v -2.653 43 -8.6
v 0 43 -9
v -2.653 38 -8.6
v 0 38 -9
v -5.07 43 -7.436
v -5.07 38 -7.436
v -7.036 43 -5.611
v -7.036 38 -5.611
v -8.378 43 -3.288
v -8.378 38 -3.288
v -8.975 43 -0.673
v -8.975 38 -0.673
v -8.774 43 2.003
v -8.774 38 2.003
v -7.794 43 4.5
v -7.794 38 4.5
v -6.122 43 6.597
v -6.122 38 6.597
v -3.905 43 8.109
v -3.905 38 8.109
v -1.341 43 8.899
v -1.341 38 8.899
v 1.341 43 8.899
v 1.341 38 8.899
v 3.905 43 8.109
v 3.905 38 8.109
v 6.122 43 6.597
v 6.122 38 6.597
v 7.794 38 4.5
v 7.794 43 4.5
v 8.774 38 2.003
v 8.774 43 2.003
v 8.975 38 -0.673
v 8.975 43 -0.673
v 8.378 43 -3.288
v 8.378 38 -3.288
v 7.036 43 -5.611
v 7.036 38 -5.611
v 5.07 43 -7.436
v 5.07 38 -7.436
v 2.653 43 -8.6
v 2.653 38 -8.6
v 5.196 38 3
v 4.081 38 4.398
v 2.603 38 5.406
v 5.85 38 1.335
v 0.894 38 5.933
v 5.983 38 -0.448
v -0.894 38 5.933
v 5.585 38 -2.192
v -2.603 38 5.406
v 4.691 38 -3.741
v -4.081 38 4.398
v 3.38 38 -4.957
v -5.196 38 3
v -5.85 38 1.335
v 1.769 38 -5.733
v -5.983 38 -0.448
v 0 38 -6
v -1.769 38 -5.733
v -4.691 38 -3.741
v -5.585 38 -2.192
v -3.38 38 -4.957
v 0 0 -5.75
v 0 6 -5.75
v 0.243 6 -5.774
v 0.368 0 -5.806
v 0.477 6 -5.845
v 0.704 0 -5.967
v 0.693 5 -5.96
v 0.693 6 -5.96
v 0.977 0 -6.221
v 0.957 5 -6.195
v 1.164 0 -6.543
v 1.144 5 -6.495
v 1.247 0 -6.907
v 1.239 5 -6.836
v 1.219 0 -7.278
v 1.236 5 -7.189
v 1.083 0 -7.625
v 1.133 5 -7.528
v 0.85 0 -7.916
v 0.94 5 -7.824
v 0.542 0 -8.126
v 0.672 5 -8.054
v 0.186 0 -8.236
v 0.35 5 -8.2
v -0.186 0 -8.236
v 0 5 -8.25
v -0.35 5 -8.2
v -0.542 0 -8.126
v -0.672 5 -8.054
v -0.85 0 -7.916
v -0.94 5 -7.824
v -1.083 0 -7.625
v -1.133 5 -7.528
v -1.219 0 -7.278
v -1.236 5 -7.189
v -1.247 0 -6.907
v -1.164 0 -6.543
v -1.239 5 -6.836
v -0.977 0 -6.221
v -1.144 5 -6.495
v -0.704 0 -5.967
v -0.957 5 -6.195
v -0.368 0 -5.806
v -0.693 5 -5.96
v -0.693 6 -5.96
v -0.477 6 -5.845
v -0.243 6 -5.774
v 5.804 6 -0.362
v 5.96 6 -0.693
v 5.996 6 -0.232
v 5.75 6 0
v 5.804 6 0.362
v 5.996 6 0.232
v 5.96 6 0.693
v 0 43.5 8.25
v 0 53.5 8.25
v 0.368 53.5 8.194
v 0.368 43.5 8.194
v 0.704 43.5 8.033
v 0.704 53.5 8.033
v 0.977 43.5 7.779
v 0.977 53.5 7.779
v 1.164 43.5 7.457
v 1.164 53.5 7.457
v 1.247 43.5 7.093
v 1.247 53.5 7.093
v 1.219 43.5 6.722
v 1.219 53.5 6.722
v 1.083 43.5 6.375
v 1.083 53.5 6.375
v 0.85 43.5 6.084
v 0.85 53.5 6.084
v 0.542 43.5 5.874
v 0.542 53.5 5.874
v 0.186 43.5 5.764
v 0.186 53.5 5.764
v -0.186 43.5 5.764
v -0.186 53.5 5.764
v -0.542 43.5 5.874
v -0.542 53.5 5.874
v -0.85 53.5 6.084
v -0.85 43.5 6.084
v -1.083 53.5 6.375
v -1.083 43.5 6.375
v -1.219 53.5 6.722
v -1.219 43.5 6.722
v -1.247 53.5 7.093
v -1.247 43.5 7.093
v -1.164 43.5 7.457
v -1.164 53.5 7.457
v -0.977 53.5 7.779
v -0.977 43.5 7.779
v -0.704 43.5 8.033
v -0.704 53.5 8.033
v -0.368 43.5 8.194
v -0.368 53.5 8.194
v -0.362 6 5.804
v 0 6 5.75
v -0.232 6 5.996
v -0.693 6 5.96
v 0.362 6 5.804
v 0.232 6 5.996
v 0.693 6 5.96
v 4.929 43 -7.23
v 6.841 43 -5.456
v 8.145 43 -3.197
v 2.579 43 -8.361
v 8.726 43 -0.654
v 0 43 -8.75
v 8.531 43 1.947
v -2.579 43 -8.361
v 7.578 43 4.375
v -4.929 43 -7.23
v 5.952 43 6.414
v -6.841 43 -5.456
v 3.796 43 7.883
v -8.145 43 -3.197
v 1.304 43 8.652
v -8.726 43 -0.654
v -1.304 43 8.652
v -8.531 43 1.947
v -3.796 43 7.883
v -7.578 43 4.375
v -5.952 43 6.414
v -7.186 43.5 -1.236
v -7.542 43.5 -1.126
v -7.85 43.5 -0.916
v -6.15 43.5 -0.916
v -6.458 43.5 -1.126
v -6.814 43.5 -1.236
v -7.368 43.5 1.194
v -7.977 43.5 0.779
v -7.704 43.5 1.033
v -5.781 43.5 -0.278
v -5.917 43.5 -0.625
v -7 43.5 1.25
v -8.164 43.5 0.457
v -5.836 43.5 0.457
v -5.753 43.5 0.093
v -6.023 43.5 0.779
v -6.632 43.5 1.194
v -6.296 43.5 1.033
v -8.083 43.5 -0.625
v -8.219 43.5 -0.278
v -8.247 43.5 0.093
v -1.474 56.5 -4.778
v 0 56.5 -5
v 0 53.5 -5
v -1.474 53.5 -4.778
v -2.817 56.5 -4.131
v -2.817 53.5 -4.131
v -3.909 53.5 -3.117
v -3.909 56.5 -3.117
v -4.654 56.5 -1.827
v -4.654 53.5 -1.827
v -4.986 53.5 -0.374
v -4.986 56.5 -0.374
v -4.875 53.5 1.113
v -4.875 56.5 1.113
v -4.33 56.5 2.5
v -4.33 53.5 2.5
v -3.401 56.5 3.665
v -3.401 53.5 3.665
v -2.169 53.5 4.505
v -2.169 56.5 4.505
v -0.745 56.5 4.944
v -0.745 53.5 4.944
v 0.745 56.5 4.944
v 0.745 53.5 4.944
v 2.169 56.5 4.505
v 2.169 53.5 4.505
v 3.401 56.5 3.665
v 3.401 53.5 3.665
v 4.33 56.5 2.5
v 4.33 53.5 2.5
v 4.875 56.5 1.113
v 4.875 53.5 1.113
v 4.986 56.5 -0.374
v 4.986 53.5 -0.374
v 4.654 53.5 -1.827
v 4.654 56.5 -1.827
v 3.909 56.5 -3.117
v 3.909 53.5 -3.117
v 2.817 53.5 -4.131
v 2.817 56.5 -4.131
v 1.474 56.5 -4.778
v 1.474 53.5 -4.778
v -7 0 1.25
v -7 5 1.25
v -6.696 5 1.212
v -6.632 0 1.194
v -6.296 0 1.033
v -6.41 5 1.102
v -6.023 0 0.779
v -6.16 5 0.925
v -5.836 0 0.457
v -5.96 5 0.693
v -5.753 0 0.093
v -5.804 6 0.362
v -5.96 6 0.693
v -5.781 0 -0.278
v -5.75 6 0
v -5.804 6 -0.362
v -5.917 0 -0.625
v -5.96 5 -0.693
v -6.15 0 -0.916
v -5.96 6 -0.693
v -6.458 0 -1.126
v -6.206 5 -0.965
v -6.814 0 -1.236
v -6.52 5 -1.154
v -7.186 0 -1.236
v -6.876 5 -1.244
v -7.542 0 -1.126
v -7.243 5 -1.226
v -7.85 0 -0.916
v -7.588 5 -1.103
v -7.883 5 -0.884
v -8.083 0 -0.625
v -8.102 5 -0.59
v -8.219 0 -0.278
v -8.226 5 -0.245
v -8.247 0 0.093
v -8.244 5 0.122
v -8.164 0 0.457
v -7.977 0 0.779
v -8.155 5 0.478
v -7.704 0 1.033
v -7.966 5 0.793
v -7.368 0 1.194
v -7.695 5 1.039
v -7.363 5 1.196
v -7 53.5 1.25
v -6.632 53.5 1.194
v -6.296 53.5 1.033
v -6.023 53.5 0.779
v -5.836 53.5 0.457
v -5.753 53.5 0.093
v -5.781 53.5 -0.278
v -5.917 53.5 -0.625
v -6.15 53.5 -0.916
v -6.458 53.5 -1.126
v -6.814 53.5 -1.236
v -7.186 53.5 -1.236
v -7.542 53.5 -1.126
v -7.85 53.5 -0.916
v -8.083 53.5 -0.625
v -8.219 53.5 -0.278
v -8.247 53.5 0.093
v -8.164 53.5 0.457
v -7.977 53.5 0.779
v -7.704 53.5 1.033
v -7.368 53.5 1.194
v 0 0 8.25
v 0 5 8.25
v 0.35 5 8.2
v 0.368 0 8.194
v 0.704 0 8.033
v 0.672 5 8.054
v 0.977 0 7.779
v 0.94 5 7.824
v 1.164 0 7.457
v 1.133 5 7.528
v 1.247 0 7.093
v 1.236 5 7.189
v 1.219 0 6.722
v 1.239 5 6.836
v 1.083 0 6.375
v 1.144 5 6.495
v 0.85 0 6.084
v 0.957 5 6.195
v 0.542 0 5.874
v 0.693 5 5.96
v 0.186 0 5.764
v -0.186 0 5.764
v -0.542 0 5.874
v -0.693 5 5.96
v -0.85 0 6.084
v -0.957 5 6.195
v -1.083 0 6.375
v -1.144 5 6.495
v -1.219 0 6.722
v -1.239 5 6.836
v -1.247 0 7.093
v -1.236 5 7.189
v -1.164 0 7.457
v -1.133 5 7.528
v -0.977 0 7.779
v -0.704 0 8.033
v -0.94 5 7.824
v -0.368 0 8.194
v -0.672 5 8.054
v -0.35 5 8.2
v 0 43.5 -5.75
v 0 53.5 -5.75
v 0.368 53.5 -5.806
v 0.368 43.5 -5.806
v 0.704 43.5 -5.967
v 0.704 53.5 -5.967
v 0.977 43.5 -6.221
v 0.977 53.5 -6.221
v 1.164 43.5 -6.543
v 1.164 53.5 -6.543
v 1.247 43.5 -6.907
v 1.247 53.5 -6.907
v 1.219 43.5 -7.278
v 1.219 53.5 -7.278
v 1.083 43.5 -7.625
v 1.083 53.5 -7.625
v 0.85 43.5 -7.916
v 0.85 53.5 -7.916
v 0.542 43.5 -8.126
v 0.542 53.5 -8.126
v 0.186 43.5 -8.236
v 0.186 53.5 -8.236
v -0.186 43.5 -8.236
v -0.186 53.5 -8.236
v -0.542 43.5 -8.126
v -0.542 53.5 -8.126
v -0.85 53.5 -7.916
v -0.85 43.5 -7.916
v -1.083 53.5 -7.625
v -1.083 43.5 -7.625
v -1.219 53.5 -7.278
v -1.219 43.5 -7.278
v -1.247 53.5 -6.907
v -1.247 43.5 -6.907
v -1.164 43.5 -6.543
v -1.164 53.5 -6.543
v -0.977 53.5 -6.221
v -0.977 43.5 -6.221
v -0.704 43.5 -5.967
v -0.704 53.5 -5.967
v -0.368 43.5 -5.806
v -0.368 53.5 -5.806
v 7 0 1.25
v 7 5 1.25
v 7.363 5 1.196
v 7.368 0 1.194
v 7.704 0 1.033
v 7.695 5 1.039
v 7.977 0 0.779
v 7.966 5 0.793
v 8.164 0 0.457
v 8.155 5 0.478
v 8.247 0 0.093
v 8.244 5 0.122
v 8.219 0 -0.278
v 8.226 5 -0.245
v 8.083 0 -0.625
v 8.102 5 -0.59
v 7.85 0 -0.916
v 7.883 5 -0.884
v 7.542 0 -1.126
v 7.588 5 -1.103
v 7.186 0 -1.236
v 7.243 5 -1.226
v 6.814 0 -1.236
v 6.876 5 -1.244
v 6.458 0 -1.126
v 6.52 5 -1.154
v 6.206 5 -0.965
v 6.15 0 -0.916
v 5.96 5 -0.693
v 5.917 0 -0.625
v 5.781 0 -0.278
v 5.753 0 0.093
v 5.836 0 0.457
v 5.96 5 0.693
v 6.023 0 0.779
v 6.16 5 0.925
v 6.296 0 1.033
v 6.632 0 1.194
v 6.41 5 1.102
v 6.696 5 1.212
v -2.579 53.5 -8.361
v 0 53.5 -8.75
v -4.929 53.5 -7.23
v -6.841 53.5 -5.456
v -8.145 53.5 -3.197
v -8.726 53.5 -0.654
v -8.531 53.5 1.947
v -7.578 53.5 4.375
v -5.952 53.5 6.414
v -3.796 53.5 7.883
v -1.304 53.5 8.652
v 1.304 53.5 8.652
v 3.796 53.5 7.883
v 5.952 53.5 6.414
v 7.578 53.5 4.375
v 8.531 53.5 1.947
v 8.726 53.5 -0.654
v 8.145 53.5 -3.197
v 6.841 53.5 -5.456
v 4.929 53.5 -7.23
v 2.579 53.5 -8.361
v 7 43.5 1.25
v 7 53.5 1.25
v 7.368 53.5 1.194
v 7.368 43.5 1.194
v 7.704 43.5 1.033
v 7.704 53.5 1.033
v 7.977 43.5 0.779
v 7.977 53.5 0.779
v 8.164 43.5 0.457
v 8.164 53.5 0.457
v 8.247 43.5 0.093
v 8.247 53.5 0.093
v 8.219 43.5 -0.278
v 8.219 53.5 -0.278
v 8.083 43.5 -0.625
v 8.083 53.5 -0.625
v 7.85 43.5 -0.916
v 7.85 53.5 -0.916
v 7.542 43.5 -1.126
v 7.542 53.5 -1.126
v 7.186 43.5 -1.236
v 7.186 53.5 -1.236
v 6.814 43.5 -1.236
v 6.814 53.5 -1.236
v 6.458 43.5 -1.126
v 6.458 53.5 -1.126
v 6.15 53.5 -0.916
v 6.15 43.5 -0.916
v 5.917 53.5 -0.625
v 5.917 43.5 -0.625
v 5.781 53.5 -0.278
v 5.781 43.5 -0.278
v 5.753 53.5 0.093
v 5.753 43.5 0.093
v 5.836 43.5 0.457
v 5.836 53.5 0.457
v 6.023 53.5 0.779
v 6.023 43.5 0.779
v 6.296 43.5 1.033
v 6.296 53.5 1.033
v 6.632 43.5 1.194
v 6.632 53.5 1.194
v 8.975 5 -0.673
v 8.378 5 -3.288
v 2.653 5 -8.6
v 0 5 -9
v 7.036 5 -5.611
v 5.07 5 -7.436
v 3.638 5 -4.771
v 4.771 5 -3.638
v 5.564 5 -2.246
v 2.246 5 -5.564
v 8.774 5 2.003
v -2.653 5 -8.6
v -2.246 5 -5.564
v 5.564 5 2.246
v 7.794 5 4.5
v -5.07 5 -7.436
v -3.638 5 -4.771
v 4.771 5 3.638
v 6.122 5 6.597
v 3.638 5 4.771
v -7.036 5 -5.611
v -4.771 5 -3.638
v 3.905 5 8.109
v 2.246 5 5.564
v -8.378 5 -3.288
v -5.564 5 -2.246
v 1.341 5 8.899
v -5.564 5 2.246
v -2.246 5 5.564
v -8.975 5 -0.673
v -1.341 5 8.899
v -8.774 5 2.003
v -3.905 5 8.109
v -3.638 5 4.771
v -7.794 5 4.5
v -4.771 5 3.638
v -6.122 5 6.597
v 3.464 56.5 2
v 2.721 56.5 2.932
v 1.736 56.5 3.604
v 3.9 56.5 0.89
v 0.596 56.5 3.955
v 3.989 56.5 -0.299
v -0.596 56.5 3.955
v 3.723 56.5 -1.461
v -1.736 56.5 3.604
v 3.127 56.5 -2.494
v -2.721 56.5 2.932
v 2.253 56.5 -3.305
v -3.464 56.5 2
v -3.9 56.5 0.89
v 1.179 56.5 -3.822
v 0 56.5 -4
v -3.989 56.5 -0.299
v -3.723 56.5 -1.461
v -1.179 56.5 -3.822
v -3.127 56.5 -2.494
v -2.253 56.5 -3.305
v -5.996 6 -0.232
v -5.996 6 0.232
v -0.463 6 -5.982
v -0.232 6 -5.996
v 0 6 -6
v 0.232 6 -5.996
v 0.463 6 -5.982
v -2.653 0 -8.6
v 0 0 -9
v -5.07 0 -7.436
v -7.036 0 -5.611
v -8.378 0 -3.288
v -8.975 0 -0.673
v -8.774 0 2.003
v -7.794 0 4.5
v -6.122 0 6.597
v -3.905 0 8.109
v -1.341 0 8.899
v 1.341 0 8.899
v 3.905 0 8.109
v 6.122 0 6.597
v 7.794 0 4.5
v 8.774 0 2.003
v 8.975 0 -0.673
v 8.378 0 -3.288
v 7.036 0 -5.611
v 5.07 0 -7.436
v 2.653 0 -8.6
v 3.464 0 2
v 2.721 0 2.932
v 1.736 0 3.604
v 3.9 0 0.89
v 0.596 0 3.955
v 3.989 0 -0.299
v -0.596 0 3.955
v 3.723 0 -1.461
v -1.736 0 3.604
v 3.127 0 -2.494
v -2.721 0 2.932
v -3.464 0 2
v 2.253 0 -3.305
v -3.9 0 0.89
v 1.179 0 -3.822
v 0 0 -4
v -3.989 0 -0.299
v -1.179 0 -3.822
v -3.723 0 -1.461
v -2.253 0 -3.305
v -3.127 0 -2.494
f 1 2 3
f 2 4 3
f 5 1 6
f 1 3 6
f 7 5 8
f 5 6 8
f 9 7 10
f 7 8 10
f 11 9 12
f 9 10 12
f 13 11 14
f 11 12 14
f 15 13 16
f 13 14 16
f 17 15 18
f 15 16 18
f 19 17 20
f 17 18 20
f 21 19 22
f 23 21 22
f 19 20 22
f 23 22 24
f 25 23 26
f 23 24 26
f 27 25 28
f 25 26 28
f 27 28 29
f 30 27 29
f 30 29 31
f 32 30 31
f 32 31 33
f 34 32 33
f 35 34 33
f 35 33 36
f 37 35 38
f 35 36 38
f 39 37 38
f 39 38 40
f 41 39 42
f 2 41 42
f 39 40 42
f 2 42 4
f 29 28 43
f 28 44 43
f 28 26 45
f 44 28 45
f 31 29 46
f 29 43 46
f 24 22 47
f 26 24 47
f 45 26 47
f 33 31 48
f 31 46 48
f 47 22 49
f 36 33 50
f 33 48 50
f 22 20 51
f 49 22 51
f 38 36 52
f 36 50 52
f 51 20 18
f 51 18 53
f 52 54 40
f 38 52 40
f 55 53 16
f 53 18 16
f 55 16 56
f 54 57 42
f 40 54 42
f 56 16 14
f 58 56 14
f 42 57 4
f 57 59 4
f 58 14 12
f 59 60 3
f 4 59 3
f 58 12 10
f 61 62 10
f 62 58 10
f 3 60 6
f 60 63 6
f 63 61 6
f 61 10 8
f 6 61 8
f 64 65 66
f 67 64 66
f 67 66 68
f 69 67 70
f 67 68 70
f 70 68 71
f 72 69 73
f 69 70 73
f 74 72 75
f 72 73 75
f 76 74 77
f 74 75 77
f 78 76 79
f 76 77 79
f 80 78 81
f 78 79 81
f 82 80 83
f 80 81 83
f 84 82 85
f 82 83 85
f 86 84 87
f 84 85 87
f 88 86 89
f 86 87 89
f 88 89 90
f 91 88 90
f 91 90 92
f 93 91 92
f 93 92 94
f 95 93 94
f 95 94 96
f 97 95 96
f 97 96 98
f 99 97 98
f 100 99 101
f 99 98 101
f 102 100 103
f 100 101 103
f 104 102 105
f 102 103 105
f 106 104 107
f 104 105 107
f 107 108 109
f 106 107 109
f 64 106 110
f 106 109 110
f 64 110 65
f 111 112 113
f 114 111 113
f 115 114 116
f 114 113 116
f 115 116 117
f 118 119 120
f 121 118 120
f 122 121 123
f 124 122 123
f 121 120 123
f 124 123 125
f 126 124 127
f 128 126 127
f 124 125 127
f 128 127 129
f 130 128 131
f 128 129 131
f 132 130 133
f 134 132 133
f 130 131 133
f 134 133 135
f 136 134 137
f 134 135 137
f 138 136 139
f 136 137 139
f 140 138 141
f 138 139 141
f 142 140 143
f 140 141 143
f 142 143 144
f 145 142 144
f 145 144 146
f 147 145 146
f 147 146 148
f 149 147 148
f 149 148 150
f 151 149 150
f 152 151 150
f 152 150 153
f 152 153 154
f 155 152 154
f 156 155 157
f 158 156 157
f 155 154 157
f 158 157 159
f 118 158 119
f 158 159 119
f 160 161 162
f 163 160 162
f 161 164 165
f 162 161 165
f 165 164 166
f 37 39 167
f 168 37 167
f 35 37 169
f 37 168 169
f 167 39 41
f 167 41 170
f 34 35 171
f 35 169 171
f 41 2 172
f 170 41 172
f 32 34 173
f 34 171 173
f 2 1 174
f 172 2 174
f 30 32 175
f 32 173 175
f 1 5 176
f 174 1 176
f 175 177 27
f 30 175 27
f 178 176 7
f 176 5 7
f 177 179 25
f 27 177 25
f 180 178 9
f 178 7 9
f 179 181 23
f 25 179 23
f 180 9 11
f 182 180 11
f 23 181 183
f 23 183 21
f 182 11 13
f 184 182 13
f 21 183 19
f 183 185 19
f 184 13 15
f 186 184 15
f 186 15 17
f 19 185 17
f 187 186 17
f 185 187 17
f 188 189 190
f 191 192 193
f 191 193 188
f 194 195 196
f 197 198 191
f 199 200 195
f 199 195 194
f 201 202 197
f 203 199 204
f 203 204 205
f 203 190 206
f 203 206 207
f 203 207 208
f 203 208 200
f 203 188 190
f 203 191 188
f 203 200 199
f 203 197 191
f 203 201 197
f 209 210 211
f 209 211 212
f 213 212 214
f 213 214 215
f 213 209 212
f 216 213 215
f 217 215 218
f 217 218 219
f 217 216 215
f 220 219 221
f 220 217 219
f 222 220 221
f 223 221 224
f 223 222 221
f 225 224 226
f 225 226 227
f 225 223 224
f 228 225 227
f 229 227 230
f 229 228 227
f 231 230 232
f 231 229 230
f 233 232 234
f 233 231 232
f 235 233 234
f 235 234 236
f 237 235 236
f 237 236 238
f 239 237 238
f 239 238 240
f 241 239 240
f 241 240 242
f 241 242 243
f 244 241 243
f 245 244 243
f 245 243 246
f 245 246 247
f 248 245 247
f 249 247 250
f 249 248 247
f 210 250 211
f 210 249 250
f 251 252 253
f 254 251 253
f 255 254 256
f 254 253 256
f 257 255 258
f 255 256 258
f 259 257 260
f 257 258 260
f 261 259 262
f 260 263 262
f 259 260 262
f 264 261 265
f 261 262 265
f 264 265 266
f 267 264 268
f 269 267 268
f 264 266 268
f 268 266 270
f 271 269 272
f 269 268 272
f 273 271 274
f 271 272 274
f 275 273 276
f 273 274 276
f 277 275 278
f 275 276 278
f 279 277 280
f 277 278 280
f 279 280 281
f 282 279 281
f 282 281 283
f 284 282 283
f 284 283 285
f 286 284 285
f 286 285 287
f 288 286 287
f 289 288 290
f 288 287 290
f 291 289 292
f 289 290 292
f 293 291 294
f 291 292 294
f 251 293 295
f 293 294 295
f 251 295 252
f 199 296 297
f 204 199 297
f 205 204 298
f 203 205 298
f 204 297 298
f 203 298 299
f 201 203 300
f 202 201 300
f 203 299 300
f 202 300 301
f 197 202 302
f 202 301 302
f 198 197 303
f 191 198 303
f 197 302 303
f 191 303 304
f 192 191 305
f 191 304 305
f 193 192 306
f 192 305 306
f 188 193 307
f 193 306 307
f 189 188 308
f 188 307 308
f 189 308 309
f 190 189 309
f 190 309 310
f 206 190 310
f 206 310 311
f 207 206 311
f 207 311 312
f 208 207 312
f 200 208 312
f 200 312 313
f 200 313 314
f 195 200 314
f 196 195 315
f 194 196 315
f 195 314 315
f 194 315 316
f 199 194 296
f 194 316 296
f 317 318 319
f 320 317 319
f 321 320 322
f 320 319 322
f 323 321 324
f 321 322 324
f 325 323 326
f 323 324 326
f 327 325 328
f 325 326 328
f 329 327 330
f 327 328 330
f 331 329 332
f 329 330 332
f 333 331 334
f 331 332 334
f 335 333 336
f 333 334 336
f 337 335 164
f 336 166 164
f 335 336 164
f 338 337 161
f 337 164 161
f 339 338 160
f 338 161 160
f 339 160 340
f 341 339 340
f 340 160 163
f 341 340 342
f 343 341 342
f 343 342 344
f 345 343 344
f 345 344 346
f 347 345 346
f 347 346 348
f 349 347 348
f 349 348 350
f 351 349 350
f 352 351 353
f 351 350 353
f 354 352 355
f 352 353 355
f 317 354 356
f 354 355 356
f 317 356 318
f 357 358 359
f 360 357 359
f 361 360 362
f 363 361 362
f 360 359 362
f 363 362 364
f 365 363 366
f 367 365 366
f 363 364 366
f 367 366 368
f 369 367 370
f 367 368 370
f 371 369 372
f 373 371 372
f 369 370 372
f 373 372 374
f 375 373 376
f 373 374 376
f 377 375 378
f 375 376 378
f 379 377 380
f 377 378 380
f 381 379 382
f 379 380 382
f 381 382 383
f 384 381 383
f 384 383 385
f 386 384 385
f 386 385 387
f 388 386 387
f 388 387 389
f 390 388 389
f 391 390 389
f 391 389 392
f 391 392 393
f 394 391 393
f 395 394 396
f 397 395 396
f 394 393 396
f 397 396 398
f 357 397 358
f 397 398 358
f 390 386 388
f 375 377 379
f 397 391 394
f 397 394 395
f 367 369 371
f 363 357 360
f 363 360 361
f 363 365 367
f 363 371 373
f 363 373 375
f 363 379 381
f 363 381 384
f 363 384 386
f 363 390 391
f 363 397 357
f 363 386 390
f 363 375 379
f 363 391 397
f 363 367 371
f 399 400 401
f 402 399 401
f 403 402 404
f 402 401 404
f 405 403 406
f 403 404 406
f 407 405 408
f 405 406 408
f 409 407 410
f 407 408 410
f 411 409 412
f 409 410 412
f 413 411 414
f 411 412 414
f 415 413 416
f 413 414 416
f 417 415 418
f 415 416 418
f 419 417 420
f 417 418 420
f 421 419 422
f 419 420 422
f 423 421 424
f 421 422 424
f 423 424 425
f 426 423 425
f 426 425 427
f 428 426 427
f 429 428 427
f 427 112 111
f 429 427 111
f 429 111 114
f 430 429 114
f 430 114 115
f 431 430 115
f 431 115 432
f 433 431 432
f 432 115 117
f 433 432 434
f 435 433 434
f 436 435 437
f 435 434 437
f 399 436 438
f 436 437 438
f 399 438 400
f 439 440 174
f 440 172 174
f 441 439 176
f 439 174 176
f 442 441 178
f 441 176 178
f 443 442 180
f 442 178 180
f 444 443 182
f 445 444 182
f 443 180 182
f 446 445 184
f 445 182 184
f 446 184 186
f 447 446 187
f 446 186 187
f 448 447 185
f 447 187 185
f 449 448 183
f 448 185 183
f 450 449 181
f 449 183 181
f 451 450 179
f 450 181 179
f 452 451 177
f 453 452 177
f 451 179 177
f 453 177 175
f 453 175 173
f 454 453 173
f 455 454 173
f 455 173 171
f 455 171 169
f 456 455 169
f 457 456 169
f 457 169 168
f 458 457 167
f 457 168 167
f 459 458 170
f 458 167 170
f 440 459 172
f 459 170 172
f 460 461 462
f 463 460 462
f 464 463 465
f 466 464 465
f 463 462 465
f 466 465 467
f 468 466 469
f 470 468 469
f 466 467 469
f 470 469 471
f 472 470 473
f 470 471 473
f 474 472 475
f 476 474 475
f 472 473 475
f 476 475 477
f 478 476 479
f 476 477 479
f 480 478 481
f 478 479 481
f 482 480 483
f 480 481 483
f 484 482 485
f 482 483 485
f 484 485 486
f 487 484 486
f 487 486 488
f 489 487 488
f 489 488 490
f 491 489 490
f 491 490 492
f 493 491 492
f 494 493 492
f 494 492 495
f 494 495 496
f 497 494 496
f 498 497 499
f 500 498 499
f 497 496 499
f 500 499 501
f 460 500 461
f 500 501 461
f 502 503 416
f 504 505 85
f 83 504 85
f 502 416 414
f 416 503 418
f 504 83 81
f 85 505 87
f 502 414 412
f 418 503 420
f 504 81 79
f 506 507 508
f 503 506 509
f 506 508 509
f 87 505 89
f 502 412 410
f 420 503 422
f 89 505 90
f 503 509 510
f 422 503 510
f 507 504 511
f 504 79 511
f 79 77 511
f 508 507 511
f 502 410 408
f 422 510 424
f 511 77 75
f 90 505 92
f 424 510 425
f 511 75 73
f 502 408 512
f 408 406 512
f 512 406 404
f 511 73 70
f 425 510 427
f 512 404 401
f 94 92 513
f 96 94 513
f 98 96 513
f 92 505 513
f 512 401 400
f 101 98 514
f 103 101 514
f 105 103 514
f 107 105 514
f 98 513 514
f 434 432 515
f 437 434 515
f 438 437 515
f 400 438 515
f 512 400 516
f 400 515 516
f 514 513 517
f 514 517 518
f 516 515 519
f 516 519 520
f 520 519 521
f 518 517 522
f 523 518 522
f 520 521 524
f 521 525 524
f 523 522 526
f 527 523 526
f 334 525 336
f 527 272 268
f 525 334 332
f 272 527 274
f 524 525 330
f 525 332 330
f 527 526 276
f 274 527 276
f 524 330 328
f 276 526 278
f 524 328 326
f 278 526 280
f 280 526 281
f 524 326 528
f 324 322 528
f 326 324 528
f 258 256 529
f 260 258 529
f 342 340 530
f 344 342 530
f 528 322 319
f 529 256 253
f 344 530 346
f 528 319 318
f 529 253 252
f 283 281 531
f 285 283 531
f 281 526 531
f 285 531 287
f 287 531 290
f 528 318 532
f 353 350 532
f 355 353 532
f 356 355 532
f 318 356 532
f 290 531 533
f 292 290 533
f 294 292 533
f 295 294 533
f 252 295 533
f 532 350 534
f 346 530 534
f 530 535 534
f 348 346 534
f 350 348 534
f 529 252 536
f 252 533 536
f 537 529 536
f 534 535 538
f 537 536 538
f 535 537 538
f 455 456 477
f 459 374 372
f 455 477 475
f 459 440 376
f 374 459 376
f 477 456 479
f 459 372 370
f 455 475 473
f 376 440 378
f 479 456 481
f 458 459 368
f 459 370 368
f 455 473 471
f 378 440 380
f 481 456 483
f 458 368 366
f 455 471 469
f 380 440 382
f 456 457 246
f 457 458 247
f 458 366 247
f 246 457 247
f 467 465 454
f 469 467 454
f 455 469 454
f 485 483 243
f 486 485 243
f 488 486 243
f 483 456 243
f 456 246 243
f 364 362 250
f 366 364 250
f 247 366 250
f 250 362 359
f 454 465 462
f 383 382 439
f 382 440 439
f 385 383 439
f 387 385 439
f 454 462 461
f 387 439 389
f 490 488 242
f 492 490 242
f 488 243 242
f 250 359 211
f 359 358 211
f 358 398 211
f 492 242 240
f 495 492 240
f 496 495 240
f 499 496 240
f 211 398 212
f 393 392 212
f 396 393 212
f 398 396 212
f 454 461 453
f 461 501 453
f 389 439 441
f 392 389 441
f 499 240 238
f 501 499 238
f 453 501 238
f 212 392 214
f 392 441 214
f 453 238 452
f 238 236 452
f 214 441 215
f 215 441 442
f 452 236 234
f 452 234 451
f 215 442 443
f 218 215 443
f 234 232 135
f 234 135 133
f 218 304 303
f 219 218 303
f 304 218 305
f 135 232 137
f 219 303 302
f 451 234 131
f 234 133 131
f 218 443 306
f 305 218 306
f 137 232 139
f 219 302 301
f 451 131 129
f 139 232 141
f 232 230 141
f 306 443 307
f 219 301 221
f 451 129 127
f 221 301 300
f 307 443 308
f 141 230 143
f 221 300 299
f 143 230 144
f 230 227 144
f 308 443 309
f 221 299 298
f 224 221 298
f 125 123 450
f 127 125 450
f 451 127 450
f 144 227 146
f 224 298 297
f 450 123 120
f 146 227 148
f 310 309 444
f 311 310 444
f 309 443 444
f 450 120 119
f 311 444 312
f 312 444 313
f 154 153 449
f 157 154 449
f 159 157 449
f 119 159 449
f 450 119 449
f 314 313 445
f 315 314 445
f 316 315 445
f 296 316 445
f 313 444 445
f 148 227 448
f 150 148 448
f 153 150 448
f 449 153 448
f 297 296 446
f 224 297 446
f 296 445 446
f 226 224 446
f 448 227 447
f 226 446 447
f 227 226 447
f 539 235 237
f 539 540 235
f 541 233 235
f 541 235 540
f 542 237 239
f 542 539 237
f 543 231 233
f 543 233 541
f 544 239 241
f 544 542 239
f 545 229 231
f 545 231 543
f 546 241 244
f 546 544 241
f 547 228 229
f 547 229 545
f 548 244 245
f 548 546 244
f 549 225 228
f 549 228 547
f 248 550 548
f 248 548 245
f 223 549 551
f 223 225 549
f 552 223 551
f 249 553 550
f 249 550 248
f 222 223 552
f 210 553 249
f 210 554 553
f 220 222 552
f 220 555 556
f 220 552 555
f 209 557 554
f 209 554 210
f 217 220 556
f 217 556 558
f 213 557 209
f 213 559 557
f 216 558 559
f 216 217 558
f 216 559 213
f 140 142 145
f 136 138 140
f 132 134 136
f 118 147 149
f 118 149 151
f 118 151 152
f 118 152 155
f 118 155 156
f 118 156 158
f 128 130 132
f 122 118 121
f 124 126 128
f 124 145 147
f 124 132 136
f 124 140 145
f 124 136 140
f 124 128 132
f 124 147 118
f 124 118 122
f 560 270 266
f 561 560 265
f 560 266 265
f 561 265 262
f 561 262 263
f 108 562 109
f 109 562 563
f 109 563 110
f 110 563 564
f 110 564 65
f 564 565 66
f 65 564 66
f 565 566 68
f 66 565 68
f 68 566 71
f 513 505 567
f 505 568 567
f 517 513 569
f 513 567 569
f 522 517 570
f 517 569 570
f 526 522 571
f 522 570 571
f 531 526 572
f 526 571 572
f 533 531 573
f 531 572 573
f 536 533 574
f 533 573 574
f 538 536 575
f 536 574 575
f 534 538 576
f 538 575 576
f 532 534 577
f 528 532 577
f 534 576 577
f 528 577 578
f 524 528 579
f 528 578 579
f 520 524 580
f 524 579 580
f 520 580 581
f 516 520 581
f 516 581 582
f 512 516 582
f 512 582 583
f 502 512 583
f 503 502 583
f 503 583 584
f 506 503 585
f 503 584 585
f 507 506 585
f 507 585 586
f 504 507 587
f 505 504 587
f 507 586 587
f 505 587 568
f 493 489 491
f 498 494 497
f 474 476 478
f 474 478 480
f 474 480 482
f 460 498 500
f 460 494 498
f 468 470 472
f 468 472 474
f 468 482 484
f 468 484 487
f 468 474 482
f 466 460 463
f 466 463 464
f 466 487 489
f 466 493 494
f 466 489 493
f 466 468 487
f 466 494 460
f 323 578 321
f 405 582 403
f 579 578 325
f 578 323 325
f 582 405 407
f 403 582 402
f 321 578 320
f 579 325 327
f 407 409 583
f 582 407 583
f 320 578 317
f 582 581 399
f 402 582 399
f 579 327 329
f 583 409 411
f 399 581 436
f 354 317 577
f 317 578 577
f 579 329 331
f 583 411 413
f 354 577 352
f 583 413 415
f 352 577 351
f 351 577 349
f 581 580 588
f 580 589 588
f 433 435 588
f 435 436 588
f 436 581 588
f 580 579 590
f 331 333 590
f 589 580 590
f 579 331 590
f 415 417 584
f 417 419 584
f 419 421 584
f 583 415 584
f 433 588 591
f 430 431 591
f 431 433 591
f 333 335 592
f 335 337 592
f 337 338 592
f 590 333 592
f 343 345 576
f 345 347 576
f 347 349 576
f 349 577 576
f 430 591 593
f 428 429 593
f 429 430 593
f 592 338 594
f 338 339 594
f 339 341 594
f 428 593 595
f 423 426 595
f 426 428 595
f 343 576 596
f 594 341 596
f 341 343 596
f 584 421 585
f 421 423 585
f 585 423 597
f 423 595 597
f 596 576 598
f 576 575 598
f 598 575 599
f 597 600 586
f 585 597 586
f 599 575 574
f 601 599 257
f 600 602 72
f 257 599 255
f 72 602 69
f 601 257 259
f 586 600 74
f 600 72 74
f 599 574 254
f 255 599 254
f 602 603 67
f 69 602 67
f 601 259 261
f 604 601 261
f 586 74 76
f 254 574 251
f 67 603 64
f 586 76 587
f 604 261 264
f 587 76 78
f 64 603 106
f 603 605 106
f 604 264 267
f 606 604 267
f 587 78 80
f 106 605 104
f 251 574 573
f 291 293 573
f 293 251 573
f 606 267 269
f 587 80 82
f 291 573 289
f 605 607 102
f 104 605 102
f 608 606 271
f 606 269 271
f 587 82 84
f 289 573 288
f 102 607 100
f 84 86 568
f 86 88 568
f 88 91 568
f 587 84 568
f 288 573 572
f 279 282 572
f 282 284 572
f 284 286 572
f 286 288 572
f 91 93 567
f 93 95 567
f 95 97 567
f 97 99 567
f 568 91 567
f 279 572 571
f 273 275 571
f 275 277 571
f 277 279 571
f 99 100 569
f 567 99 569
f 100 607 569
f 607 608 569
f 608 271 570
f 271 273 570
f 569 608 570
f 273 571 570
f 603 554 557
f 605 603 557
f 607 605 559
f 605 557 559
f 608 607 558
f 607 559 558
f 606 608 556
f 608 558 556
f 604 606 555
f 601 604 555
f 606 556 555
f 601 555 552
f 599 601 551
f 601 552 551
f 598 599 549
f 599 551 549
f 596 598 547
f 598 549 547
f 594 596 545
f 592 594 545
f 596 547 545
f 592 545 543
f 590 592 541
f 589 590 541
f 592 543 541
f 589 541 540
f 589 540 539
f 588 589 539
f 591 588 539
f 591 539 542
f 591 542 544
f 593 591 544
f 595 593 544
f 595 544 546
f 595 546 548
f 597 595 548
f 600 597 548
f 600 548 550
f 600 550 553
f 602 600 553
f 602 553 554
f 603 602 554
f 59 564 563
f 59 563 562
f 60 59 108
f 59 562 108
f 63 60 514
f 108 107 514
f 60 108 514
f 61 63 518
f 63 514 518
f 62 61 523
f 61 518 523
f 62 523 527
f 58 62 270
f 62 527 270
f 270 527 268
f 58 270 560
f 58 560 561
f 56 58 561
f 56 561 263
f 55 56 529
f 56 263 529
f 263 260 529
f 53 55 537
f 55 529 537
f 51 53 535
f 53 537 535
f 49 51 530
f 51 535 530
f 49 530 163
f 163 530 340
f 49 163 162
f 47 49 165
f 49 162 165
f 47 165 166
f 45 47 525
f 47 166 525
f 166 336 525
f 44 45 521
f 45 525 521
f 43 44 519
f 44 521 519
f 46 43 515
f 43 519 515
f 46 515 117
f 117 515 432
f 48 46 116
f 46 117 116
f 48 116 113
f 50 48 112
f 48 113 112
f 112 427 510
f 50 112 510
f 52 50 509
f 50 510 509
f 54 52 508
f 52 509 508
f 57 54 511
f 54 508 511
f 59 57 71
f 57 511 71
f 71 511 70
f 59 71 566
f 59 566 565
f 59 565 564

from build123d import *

# Parameters (mm, degrees)
SKETCH_2_R          = 1.25
CUT_EXTRUDE_1_DEPTH = 10
CUT_EXTRUDE_START   = -47.5
SKETCH_2_2_R        = 1.25
CUT_EXTRUDE_2_DEPTH = 6
EXTRUDE_START       = 3
SKETCH_4_R          = 5
SKETCH_4_R_2        = 4
EXTRUDE_1_DEPTH     = 3


with BuildPart() as part:
    # 草图1 → 旋转1 (revolve)
    with BuildSketch(Plane.XY, mode=Mode.PRIVATE) as revolve_1_sk:
        Polygon((-9, 38), (-6, 38), (-6, 5), (-9, 5), (-9, 0), (-4, 0), (-4, 53.5), (-8.75, 53.5), (-8.75, 43), (-9, 43), align=None)
    revolve(revolve_1_sk.sketch.rotate(Axis((0, 0, 0), (0, 1, 0)), 270), axis=Axis((0, 0, 0), (0, 1, 0)))

    # 草图2 → 切除-拉伸1 (cut)
    with BuildSketch(Plane(origin=(0, 53.5, 0), x_dir=(1, 0, 0), z_dir=(0, 1, 0))):
        with Locations(Location((0, 7, 0), (0, 0, 270))):
            Circle(SKETCH_2_R)
        with Locations(Location((7, 0, 0), (0, 0, 270))):
            Circle(SKETCH_2_R)
        with Locations(Location((0, -7, 0), (0, 0, 270))):
            Circle(SKETCH_2_R)
        with Locations(Location((-7, 0, 0), (0, 0, 270))):
            Circle(SKETCH_2_R)
    extrude(amount=-CUT_EXTRUDE_1_DEPTH, mode=Mode.SUBTRACT)

    # 草图2<2> → 切除-拉伸2 (cut)
    with BuildSketch(Plane(origin=(0, 53.5, 0), x_dir=(1, 0, 0), z_dir=(0, 1, 0)).offset(CUT_EXTRUDE_START)):
        with Locations(Location((0, 7, 0), (0, 0, 270))):
            Circle(SKETCH_2_2_R)
        with Locations(Location((7, 0, 0), (0, 0, 270))):
            Circle(SKETCH_2_2_R)
        with Locations(Location((0, -7, 0), (0, 0, 270))):
            Circle(SKETCH_2_2_R)
        with Locations(Location((-7, 0, 0), (0, 0, 270))):
            Circle(SKETCH_2_2_R)
    extrude(amount=-CUT_EXTRUDE_2_DEPTH, mode=Mode.SUBTRACT)

    # 草图4 → 凸台-拉伸1 (add)
    with BuildSketch(Plane(origin=(0, 53.5, 0), x_dir=(1, 0, 0), z_dir=(0, 1, 0)).offset(EXTRUDE_START)):
        with Locations(Location((0, 0, 0), (0, 0, 90))):
            Circle(SKETCH_4_R)
        with Locations(Location((0, 0, 0), (0, 0, 90))):
            Circle(SKETCH_4_R_2, mode=Mode.SUBTRACT)
    extrude(amount=-EXTRUDE_1_DEPTH)


solid = part.part
